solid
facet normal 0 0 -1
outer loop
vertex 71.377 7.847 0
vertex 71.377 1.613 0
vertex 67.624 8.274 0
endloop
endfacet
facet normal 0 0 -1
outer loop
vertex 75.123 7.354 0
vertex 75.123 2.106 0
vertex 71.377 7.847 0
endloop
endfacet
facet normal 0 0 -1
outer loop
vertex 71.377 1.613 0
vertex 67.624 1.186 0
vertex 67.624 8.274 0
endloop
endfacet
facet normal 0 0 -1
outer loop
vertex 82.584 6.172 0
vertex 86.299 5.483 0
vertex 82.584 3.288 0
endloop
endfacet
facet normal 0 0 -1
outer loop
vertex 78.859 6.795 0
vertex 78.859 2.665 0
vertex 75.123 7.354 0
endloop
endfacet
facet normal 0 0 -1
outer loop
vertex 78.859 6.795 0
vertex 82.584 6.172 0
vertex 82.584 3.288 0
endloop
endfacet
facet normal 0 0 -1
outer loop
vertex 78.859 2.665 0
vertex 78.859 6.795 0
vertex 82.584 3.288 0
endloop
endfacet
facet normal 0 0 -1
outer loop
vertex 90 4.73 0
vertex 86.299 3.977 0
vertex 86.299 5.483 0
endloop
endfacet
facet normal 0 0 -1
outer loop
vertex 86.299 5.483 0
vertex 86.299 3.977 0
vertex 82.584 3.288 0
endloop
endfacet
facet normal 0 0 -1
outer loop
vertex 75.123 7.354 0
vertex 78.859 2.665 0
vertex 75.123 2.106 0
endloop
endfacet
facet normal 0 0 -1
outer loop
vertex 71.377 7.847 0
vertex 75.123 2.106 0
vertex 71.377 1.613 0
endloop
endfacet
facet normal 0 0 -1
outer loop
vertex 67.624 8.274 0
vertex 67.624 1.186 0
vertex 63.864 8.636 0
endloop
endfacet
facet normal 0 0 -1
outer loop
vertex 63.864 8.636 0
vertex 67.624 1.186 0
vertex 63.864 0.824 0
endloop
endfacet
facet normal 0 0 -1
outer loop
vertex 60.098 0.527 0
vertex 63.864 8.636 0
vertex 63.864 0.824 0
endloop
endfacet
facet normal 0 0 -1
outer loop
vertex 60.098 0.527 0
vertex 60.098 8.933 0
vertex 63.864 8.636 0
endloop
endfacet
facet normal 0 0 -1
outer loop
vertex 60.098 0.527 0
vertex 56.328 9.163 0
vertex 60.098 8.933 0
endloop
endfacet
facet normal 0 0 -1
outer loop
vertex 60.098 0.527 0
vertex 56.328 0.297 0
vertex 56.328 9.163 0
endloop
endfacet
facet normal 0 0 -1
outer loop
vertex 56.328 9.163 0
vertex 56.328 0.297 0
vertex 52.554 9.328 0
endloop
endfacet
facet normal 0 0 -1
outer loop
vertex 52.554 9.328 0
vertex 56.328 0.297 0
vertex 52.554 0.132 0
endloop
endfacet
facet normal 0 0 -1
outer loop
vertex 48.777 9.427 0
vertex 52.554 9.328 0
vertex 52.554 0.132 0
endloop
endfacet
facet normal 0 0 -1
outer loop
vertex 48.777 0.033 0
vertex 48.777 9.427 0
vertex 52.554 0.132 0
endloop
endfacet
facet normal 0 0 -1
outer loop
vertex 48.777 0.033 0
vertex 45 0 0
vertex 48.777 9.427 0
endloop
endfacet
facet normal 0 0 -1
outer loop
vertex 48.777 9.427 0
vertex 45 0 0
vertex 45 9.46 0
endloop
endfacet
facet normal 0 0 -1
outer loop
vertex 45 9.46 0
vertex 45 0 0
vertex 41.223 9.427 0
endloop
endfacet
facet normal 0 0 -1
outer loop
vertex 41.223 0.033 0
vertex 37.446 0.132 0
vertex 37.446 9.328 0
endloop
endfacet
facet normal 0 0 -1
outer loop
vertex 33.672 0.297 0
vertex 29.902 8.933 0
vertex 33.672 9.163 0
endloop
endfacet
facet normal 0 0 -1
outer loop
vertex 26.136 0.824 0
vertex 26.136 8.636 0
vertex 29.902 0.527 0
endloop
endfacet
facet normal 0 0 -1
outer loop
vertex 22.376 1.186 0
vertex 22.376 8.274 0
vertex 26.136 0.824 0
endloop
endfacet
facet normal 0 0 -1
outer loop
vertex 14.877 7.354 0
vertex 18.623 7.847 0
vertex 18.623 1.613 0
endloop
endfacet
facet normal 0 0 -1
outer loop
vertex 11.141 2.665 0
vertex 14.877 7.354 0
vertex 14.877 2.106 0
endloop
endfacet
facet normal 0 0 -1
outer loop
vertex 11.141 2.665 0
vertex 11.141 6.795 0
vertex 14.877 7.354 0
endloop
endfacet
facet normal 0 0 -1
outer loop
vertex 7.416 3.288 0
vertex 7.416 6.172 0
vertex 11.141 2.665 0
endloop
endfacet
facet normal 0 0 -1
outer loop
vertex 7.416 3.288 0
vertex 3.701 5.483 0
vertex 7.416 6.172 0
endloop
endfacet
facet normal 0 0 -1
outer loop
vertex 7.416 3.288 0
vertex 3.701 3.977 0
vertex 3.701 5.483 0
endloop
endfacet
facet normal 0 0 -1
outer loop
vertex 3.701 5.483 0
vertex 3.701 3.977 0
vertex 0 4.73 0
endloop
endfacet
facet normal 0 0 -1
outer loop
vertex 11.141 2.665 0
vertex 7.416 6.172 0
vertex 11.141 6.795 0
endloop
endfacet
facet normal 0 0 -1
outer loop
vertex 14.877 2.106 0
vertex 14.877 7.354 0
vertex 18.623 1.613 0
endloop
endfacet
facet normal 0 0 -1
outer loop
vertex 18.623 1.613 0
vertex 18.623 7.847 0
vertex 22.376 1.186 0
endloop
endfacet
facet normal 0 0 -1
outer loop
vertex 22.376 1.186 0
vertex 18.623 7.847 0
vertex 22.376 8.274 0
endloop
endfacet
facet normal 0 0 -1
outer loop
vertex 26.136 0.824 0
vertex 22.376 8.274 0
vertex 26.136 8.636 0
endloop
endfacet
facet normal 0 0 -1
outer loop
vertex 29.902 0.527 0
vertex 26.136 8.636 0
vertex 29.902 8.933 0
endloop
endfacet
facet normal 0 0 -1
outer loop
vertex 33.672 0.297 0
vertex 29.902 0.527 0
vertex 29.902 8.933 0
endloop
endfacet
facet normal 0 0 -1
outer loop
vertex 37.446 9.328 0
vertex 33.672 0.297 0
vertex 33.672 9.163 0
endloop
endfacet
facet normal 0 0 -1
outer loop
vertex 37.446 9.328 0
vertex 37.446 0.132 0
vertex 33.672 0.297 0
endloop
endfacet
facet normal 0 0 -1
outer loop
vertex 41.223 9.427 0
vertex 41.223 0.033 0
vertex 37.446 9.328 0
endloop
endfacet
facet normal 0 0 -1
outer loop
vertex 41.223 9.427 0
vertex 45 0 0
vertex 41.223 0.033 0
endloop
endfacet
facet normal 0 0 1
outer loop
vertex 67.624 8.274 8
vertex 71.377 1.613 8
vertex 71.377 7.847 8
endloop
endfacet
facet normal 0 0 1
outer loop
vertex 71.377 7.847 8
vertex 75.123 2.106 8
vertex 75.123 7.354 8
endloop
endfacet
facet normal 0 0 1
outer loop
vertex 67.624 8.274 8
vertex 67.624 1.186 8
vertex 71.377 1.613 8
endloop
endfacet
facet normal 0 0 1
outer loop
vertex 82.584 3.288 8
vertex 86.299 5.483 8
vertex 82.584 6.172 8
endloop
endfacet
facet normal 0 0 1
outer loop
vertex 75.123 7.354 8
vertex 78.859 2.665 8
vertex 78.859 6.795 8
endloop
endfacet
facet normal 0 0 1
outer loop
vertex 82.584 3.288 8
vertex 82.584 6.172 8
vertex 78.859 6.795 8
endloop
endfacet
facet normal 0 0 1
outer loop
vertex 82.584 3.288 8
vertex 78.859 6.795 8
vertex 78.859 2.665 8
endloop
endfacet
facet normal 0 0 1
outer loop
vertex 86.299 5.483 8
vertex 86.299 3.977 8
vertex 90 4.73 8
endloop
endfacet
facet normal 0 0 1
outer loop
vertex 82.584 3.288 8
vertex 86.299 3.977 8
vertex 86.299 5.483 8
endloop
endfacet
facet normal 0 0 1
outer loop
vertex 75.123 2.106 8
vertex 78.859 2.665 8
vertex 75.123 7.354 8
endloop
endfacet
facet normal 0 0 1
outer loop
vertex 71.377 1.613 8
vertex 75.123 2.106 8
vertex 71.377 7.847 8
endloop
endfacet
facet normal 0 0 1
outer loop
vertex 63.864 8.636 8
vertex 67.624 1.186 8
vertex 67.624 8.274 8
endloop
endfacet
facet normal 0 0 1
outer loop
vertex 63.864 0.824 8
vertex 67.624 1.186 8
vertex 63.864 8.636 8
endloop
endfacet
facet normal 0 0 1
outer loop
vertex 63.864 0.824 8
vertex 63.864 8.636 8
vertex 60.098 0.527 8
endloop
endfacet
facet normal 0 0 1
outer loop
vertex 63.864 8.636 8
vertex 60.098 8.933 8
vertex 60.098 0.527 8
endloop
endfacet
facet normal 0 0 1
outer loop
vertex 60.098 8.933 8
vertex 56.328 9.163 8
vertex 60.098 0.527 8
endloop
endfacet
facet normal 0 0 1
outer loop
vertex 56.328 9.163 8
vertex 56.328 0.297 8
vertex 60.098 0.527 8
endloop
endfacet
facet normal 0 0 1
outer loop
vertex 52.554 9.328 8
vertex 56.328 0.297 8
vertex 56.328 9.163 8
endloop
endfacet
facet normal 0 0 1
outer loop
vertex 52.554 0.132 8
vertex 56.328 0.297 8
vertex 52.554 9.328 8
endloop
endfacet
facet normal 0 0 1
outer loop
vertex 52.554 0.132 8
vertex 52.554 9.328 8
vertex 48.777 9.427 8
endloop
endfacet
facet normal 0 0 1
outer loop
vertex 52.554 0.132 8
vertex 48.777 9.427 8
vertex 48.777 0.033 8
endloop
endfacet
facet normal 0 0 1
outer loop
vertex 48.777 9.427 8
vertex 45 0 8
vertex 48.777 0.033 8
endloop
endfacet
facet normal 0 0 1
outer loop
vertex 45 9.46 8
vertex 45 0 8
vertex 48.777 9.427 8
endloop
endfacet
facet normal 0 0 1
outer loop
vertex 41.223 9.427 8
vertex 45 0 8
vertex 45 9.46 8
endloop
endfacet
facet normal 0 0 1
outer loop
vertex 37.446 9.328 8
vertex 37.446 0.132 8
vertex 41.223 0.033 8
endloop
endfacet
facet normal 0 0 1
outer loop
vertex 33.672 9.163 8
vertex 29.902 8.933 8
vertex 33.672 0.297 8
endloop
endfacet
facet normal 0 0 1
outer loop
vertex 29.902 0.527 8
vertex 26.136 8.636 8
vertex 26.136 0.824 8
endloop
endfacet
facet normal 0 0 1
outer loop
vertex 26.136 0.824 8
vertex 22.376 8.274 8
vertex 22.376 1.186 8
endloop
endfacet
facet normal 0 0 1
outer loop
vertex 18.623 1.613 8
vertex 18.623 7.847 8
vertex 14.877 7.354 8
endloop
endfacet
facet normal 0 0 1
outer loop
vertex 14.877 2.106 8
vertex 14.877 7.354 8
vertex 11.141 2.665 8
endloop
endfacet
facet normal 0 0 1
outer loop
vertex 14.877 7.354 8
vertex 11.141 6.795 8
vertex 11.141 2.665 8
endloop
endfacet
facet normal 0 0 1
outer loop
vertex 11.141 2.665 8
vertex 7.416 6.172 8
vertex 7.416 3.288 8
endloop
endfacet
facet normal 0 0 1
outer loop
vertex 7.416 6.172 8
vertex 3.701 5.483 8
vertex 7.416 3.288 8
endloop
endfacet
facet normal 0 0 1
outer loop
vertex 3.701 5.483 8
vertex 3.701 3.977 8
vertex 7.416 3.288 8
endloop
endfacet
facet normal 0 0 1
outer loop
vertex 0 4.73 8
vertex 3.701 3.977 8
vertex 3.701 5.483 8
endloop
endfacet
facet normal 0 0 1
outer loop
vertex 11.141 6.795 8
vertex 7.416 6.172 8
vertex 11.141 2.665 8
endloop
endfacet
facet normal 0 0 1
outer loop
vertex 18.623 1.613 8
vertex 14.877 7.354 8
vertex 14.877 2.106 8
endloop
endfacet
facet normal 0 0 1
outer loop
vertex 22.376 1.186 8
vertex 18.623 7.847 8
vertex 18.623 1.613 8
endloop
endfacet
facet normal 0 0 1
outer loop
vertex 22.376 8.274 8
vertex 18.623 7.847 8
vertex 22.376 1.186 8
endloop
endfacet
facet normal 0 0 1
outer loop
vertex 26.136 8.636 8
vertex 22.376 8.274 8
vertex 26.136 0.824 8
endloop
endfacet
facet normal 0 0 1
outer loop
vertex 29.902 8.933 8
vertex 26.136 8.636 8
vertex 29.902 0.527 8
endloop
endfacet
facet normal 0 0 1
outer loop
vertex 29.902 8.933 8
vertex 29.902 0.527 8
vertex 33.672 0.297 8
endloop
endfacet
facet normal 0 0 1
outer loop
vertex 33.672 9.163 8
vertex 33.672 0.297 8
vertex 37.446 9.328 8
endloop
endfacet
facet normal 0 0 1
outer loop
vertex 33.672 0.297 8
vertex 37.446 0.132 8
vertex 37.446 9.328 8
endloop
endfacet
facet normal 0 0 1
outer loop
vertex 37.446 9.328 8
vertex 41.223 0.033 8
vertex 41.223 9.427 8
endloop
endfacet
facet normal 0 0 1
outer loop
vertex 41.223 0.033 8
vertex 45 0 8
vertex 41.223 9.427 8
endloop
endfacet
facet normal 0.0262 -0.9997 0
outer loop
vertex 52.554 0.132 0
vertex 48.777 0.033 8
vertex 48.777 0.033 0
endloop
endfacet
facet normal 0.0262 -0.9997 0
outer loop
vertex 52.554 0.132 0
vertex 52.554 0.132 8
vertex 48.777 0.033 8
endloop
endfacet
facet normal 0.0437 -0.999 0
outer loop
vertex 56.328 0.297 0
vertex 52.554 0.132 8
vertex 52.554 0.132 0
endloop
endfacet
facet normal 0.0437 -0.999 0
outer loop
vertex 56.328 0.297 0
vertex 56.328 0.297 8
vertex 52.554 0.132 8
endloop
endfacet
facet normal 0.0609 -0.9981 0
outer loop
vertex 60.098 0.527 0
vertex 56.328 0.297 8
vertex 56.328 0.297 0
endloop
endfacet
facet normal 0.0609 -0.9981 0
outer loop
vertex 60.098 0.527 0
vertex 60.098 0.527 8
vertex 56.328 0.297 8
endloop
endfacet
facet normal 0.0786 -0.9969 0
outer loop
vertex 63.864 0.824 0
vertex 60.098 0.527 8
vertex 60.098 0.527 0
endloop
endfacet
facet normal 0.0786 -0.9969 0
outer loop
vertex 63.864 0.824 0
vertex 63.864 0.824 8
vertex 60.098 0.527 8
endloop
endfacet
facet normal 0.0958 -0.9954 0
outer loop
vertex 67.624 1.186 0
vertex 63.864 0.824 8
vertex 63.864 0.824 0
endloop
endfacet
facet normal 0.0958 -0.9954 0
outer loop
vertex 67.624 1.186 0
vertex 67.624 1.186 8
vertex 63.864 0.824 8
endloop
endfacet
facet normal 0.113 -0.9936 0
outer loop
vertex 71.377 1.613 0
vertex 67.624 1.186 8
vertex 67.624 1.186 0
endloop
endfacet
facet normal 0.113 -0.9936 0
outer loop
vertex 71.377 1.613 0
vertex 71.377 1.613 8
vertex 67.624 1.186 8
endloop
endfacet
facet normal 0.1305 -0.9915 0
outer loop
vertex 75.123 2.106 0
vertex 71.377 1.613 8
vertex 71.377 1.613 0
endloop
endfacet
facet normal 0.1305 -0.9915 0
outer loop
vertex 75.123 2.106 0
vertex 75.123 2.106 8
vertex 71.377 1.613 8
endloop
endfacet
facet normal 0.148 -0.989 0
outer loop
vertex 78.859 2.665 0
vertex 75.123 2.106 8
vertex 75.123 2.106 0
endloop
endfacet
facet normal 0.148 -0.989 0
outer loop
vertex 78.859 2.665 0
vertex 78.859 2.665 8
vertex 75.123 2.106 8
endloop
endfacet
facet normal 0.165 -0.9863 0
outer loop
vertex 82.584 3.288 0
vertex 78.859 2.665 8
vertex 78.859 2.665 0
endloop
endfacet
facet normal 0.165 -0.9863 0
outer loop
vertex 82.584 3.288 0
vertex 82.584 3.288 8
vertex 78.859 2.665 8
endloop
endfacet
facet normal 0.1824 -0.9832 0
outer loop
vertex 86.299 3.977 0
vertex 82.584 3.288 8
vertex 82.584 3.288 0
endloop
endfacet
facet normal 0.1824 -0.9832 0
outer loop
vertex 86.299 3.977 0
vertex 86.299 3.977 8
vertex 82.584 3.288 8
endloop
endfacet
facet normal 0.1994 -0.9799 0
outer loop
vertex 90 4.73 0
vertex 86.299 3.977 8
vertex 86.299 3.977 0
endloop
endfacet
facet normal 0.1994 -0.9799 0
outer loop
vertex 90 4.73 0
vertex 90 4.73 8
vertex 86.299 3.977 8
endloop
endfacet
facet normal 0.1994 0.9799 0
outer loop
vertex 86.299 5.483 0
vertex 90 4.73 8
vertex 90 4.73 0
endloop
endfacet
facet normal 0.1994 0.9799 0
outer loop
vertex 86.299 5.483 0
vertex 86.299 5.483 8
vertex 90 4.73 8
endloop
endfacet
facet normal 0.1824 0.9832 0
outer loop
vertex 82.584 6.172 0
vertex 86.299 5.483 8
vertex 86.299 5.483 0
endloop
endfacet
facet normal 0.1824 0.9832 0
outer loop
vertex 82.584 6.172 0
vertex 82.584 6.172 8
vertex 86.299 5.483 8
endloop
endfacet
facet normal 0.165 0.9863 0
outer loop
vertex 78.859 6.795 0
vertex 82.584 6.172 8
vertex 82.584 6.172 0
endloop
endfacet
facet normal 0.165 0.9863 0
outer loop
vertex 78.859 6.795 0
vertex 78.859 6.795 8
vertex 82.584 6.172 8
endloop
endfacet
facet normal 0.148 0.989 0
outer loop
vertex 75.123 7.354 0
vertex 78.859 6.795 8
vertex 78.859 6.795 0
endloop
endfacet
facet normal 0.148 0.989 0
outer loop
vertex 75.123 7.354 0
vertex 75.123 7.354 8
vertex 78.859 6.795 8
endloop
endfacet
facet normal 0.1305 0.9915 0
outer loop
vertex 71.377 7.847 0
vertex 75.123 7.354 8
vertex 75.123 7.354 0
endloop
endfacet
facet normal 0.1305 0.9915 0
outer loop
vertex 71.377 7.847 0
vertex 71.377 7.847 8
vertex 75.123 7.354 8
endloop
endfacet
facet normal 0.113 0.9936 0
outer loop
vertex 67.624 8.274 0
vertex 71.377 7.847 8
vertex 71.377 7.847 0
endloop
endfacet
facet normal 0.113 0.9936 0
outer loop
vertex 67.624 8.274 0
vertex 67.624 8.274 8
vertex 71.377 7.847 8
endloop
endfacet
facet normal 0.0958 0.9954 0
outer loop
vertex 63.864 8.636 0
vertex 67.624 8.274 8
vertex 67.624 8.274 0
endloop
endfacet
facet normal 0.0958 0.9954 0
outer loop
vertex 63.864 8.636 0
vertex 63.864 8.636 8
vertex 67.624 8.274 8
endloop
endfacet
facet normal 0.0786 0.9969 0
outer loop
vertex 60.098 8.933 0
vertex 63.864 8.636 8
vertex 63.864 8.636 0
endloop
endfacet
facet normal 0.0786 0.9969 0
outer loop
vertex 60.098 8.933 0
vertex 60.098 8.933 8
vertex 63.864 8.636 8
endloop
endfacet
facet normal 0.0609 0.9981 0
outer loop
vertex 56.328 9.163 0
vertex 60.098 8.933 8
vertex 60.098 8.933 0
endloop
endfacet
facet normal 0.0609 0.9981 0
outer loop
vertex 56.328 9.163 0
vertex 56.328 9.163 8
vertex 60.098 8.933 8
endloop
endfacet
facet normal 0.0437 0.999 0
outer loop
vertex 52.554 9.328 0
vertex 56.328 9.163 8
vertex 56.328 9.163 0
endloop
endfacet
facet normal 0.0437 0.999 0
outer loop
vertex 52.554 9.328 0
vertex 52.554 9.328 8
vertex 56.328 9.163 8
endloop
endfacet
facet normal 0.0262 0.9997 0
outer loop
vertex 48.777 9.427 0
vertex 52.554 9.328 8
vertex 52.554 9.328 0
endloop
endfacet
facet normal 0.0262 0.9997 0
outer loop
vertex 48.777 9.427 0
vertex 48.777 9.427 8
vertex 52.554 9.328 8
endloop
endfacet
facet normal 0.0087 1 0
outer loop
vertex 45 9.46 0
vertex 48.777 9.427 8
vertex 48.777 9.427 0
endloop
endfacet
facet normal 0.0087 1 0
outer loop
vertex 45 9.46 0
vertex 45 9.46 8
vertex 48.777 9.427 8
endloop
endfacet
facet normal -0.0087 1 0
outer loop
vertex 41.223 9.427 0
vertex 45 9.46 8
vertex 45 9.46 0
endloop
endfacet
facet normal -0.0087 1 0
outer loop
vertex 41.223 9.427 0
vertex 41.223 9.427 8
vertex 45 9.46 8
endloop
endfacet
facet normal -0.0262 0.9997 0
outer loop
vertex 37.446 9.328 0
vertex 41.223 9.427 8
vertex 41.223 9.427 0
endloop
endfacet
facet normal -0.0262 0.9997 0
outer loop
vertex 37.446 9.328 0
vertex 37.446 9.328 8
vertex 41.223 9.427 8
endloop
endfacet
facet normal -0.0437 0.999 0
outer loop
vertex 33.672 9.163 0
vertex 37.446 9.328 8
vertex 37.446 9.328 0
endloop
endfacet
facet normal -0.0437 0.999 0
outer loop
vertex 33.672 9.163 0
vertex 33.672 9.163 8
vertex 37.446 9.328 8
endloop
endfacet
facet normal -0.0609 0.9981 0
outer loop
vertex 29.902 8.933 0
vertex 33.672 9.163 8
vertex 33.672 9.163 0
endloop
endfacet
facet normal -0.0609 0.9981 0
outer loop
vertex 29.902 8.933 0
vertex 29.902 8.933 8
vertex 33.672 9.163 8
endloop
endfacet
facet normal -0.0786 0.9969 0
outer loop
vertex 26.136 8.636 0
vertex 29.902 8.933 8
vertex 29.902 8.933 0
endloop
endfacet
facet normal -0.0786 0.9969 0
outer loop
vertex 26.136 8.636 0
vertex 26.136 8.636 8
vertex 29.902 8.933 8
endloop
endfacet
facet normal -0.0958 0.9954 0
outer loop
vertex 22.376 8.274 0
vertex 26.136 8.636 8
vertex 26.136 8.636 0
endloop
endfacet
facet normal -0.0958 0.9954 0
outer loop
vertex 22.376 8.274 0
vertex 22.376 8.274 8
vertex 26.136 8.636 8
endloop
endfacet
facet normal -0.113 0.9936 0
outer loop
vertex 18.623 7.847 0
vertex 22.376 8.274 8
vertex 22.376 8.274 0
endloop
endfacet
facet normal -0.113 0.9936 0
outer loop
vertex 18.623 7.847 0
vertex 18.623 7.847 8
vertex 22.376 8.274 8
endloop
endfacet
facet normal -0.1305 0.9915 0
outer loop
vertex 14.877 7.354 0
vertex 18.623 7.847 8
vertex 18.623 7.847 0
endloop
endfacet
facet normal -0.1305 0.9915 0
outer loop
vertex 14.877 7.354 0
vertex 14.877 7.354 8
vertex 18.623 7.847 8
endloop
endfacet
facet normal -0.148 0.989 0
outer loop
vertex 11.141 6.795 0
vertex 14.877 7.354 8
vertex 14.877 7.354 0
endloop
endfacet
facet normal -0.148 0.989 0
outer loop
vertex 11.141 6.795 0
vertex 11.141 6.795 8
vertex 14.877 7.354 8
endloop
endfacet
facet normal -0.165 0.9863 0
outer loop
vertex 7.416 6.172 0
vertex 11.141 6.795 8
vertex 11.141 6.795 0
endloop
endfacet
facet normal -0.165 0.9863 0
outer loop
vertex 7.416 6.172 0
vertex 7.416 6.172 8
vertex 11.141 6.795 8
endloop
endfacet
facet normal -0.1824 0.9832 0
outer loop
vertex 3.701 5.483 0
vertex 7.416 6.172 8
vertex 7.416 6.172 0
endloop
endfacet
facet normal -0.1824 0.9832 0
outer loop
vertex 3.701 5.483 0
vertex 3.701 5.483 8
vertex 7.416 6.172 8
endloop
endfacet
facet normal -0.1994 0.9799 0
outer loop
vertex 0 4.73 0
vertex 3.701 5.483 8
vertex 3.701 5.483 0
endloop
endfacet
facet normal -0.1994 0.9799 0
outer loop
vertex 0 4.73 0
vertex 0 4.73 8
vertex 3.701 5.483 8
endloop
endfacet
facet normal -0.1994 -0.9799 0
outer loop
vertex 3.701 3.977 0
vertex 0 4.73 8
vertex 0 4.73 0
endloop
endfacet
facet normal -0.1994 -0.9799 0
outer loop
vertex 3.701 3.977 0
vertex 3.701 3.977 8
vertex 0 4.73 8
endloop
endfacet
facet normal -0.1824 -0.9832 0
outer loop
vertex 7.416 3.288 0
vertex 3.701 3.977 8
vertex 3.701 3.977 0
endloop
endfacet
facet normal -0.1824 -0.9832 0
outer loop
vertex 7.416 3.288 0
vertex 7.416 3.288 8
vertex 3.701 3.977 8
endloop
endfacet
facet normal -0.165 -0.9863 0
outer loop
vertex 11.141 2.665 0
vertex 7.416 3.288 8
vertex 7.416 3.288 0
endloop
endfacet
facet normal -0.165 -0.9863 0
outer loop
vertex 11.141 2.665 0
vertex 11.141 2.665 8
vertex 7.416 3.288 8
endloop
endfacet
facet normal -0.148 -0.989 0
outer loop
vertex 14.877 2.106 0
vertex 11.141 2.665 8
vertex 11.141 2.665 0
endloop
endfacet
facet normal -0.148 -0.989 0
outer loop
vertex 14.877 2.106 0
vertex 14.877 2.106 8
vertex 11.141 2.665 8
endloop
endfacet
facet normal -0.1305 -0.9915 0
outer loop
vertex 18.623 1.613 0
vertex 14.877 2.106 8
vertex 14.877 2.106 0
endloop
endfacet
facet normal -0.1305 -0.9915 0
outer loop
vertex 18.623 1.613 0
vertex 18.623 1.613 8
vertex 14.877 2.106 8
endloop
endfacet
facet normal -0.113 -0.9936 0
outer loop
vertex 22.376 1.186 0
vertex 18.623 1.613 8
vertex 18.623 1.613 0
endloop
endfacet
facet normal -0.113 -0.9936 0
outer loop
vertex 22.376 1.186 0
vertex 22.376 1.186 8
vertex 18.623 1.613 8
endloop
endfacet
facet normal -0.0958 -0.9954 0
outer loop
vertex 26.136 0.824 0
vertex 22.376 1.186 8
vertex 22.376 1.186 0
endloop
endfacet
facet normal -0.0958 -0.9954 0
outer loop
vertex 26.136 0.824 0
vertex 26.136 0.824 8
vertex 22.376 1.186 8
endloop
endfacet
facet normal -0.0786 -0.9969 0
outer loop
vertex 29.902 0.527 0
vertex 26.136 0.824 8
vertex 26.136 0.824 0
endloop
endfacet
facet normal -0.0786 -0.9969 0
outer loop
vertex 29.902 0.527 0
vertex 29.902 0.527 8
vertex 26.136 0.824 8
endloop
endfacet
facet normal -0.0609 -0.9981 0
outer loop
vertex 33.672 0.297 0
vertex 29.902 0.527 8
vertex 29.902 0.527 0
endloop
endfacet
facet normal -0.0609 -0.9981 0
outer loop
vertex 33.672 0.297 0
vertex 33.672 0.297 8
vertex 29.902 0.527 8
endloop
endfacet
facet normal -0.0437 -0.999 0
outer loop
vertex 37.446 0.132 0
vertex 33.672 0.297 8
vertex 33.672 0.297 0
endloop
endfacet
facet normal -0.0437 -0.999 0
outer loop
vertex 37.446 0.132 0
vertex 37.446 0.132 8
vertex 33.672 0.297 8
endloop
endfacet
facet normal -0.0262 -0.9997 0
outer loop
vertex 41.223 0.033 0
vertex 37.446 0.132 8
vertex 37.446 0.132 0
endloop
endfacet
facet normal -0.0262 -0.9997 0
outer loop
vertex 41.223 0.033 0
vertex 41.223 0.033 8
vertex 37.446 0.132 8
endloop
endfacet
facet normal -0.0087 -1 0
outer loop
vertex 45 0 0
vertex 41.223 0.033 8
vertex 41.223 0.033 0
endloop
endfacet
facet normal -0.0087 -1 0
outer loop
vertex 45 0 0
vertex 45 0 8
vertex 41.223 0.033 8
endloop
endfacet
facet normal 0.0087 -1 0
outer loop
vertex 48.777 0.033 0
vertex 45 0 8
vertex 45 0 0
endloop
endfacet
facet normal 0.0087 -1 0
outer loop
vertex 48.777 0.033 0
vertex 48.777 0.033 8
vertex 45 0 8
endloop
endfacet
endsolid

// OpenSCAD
$fn = 32;

// ----------------------------------------------------------------------
// Arc profile plate: lens, 48 points
// ----------------------------------------------------------------------

// --- parameters (mm) ---
lens_chord = 90;          // chord length of the lens, X
arc_r = 216.44;           // radius of both arcs
arc_angle = 24;           // angle of each arc, degrees
sagitta = 4.73;           // bulge of each arc (half the lens height)
arc_step = 1;             // sampling step of the arcs, degrees
plate_t = 8;              // plate thickness, Z
fit_tol = 0.1;            // declared fit tolerance (prompt contract)
free_tol = 0.3;           // declared free tolerance (prompt contract)

bbox_y = 2 * sagitta;  // full lens height

profile = [[90, 4.73], [86.299, 5.483], [82.584, 6.172], [78.859, 6.795], [75.123, 7.354], [71.377, 7.847], [67.624, 8.274], [63.864, 8.636], [60.098, 8.933], [56.328, 9.163], [52.554, 9.328], [48.777, 9.427], [45, 9.46], [41.223, 9.427], [37.446, 9.328], [33.672, 9.163], [29.902, 8.933], [26.136, 8.636], [22.376, 8.274], [18.623, 7.847], [14.877, 7.354], [11.141, 6.795], [7.416, 6.172], [3.701, 5.483], [0, 4.73], [3.701, 3.977], [7.416, 3.288], [11.141, 2.665], [14.877, 2.106], [18.623, 1.613], [22.376, 1.186], [26.136, 0.824], [29.902, 0.527], [33.672, 0.297], [37.446, 0.132], [41.223, 0.033], [45, 0], [48.777, 0.033], [52.554, 0.132], [56.328, 0.297], [60.098, 0.527], [63.864, 0.824], [67.624, 1.186], [71.377, 1.613], [75.123, 2.106], [78.859, 2.665], [82.584, 3.288], [86.299, 3.977]];  // primary outline, 48 points, counter clockwise

// --- the one profile operation ---
linear_extrude(height = plate_t) polygon(points = profile);
